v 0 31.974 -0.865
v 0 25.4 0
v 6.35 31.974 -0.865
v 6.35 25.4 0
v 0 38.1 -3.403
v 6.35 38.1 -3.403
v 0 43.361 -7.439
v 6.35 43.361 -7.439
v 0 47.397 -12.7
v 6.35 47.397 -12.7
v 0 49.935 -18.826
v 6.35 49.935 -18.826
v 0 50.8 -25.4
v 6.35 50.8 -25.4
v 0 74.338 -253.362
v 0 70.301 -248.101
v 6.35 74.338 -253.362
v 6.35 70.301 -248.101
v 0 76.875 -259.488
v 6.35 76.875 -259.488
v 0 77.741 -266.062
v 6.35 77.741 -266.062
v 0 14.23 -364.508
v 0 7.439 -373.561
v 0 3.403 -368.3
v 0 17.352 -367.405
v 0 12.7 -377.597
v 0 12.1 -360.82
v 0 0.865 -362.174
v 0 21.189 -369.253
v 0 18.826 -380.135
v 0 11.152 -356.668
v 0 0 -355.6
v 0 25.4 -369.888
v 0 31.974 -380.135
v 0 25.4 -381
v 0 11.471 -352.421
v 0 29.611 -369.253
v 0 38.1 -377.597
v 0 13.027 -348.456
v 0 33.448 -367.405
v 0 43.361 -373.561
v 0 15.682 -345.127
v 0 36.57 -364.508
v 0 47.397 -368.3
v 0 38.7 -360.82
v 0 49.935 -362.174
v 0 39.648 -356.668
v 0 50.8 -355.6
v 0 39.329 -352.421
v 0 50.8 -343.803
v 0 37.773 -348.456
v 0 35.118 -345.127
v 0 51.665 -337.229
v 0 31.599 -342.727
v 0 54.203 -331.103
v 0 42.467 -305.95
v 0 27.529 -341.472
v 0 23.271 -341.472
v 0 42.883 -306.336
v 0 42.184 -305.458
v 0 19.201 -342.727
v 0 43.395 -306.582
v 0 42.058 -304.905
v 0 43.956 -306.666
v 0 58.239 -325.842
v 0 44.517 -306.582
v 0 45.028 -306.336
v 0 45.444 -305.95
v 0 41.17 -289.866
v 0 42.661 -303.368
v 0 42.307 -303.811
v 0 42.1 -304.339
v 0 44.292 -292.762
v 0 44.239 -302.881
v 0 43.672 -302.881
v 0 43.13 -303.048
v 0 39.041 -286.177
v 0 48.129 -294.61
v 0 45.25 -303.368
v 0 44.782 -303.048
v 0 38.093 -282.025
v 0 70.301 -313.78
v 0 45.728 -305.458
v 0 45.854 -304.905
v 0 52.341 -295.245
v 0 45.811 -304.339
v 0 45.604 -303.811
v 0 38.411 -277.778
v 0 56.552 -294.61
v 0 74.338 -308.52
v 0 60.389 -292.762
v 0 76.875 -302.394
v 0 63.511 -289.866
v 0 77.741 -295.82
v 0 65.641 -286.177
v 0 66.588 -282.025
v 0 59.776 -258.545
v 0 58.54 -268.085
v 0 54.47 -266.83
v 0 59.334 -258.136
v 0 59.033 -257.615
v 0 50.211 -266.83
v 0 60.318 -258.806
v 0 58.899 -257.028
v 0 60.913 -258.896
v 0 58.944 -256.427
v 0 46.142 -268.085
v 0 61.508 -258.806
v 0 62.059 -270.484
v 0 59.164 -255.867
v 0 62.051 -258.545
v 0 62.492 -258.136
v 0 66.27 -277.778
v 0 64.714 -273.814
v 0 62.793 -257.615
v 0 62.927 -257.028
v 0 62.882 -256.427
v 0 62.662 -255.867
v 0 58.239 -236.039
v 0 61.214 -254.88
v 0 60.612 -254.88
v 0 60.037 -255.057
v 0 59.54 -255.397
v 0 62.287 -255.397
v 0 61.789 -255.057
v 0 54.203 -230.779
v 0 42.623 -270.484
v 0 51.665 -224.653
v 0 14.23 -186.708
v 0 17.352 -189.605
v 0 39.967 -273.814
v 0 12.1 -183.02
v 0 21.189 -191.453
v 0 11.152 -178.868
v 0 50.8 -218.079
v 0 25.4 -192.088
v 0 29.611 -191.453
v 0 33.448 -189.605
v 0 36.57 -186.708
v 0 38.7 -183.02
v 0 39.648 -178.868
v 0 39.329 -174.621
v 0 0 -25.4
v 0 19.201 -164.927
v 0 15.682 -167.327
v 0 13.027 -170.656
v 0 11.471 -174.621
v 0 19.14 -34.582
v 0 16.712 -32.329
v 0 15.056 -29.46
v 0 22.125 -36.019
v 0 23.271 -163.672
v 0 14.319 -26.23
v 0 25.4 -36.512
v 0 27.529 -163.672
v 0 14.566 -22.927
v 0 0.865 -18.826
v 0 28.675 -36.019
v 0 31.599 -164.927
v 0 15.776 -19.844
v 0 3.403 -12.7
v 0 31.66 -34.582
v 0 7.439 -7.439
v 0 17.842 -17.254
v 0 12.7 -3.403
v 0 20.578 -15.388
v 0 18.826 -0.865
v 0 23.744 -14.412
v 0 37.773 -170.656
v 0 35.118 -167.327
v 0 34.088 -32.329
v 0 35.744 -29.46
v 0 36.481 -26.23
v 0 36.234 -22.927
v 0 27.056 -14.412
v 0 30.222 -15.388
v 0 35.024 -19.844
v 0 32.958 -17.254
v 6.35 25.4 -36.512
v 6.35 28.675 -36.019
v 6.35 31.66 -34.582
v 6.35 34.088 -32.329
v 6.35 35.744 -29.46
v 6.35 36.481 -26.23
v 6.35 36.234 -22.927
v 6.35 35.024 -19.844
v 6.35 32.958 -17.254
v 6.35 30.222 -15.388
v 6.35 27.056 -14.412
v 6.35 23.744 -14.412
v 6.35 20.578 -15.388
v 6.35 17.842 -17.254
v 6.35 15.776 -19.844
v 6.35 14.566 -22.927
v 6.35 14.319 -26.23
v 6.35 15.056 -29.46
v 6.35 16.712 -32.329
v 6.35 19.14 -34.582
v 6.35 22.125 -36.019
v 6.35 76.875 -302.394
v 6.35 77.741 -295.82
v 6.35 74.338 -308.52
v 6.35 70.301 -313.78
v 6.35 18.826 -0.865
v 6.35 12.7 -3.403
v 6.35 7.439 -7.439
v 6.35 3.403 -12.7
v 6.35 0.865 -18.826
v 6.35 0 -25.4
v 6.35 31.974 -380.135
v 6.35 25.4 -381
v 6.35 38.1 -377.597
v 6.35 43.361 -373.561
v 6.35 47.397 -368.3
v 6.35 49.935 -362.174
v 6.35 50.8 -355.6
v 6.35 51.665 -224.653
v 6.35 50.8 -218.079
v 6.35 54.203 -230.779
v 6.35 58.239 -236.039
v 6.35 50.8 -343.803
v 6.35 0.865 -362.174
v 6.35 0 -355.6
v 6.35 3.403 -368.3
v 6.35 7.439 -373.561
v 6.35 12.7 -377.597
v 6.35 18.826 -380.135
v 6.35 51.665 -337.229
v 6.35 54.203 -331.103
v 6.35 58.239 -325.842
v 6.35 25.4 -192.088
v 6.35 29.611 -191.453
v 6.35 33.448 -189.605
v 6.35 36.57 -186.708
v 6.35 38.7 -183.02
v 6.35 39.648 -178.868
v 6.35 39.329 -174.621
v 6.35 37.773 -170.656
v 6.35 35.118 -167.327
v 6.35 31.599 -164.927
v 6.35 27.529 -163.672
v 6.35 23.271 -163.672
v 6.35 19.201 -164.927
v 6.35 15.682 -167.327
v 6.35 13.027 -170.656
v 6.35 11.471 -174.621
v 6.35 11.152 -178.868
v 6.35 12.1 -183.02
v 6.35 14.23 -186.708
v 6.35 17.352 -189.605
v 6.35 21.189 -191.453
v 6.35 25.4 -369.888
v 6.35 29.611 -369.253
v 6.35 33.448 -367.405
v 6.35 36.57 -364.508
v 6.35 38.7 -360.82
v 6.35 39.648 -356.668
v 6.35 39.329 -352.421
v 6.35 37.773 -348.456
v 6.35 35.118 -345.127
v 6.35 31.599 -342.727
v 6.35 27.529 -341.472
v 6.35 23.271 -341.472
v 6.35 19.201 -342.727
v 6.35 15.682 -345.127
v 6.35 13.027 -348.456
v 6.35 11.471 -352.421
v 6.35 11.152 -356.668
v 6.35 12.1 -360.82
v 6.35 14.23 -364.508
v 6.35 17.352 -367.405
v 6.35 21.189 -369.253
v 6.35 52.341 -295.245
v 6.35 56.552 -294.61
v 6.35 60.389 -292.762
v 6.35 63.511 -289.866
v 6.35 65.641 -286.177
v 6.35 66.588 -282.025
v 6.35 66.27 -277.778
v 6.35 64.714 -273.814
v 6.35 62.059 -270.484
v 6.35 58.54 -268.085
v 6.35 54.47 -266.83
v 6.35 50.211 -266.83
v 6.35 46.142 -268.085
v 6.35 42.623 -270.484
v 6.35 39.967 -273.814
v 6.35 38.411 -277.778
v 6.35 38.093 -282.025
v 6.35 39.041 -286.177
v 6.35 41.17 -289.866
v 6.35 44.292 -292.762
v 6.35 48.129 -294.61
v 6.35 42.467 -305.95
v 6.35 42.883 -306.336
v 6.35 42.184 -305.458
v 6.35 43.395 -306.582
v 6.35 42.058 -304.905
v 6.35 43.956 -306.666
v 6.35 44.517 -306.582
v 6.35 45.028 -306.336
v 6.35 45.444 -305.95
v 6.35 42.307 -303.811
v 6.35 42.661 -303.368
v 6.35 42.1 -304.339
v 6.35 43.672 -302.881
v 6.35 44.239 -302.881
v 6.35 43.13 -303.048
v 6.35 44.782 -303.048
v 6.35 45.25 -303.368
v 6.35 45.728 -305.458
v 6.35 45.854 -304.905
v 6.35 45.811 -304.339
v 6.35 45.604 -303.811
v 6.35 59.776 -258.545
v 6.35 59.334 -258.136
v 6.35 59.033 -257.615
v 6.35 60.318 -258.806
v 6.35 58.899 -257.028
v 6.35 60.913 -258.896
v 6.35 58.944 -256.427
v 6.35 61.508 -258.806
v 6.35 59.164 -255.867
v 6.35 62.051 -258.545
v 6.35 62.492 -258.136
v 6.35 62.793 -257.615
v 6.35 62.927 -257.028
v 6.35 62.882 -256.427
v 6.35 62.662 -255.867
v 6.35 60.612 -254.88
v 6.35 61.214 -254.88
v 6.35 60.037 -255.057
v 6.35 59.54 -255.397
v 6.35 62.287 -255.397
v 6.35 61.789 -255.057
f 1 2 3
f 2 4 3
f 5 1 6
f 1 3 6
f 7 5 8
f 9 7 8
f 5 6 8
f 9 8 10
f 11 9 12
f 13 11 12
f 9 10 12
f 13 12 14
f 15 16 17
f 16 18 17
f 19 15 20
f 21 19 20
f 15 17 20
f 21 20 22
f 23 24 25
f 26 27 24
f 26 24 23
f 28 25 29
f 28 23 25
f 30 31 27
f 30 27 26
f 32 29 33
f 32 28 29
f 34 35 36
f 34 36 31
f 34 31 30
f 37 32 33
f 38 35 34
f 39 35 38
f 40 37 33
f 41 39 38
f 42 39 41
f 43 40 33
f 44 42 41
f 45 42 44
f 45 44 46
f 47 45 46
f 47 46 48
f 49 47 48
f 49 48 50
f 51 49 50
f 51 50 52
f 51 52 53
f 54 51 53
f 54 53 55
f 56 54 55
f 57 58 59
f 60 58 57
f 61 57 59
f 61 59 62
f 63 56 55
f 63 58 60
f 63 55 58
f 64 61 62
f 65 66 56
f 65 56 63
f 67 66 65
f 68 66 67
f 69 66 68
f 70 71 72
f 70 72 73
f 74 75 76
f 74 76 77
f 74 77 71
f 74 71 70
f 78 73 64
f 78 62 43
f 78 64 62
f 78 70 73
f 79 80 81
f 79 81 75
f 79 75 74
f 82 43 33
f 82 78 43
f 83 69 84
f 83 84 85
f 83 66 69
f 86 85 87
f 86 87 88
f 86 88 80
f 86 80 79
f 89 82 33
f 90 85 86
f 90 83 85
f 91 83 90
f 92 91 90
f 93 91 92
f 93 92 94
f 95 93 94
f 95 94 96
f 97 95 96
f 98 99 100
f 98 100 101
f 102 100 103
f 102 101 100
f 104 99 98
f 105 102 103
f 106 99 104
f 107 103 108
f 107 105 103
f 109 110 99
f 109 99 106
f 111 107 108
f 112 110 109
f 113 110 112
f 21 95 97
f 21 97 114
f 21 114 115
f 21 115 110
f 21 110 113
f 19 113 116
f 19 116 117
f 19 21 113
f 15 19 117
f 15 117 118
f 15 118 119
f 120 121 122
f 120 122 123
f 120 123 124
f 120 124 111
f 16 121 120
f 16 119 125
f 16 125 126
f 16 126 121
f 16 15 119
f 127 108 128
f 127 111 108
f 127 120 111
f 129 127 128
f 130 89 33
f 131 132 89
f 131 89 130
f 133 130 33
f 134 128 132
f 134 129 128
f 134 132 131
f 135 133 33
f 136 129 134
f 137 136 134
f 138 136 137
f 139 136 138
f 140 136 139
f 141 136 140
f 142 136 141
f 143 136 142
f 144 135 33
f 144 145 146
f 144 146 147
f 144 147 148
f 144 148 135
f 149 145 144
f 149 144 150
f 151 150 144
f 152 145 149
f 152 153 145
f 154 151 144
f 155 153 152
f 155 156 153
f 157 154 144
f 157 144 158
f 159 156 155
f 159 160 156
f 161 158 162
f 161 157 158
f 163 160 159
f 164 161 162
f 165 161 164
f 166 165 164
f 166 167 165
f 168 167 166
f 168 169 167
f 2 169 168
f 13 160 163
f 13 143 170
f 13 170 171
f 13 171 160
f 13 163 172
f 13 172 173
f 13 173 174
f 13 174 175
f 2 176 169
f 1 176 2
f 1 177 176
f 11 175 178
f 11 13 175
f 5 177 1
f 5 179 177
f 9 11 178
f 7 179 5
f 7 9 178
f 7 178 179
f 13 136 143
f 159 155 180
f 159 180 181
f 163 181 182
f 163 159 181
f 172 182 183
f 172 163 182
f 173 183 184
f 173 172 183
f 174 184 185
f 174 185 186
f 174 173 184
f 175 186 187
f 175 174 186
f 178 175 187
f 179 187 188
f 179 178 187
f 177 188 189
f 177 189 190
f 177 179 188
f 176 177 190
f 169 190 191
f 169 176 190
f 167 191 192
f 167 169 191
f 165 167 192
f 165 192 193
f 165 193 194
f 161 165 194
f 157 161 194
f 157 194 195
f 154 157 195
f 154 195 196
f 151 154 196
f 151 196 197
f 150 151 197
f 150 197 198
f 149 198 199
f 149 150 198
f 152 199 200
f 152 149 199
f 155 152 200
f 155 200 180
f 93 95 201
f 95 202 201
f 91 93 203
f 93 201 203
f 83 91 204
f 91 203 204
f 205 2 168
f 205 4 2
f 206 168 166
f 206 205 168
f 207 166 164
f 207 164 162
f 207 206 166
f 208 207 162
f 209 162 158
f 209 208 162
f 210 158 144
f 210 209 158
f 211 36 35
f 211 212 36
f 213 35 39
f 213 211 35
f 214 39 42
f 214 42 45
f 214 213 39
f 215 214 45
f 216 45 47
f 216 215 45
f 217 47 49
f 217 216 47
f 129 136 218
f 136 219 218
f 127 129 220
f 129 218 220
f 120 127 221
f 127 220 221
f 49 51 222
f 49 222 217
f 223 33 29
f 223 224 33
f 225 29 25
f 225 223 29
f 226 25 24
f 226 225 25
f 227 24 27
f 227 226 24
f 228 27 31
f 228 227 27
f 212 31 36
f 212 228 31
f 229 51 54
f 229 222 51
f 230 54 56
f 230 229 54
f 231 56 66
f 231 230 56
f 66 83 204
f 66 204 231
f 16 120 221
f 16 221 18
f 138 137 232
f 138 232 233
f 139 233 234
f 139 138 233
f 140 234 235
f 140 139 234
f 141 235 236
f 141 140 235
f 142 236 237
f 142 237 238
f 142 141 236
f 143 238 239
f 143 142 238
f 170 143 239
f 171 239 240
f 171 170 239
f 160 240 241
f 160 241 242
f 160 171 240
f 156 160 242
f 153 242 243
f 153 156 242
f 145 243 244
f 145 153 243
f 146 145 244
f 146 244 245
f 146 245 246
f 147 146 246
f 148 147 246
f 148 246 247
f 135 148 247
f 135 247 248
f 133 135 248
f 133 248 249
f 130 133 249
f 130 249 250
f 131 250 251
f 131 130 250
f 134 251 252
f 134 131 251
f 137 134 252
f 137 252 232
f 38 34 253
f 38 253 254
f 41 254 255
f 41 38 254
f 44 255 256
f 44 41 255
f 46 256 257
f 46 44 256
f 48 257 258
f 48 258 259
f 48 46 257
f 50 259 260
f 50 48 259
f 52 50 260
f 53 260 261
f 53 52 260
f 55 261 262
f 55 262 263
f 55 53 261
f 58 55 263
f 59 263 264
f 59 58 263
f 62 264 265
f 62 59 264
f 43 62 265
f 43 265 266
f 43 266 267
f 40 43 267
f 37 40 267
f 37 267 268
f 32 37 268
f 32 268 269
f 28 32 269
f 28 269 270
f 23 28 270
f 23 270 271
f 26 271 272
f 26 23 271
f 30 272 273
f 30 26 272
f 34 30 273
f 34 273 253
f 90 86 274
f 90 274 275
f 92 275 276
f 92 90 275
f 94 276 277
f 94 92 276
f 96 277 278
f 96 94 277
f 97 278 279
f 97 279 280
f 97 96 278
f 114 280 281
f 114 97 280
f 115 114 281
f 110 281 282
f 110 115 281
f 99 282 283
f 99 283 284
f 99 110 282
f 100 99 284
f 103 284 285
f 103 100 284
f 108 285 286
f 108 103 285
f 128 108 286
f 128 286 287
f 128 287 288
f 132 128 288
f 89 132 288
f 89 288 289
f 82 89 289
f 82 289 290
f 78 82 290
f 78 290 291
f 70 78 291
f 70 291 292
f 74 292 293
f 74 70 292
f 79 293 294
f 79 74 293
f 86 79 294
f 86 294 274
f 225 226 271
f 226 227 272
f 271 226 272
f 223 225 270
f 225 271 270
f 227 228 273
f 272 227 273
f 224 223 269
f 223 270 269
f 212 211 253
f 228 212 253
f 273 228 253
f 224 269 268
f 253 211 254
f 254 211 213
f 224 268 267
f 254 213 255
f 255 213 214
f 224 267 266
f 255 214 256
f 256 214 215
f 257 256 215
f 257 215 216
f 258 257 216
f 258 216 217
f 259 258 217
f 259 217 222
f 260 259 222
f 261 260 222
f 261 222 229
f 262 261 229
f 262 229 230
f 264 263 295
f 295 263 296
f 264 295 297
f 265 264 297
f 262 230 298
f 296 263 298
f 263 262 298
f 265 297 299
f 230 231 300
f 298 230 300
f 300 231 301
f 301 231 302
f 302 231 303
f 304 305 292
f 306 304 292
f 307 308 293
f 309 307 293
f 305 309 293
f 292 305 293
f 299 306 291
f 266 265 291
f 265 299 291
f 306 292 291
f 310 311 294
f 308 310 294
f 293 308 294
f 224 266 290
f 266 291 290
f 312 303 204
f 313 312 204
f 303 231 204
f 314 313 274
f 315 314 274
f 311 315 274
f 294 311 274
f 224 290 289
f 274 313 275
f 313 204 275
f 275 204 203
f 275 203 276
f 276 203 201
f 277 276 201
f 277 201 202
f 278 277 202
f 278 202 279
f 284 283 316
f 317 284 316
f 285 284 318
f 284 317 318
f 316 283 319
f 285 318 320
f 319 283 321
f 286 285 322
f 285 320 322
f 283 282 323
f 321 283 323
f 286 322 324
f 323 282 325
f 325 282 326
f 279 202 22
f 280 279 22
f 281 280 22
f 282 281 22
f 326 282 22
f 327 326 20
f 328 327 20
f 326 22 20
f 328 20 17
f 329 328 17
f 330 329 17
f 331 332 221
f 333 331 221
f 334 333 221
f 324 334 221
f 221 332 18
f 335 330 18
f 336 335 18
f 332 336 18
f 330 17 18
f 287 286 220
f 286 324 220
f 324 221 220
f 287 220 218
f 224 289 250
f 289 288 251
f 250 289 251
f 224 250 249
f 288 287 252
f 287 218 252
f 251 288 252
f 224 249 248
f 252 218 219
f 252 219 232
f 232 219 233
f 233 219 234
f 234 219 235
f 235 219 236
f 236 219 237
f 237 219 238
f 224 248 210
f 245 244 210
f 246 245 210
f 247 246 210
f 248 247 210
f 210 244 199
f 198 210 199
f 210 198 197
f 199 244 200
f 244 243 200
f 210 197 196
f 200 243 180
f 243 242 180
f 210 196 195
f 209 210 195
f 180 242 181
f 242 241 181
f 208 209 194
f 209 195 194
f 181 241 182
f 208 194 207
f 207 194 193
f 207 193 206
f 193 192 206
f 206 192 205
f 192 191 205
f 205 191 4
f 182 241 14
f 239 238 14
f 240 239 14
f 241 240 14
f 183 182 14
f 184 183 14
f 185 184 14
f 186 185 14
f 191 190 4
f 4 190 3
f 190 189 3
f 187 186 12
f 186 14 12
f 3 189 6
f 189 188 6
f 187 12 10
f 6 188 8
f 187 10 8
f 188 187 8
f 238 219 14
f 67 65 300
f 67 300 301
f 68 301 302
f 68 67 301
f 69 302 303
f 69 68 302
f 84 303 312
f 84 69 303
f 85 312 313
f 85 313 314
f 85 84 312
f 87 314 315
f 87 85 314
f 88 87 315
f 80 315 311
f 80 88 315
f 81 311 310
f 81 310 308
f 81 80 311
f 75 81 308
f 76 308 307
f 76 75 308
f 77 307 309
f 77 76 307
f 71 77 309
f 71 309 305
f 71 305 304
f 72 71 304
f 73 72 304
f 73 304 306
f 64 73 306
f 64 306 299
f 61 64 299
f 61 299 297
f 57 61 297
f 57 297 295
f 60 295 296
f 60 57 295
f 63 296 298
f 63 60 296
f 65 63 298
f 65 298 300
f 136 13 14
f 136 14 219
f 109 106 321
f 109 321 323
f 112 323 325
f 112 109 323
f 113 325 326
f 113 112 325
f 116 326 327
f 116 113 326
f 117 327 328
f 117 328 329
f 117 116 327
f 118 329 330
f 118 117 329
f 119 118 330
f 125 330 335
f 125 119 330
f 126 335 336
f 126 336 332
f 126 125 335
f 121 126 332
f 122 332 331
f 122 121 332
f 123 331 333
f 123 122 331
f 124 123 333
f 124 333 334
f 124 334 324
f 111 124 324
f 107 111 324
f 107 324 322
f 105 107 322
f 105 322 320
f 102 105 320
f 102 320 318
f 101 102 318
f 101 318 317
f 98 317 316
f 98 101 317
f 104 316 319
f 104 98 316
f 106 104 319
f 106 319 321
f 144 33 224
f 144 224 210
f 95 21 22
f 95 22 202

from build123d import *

# Parameters (mm, degrees)
SKETCH1_R           = 11.1125
SKETCH1_R_2         = 14.2875
SKETCH1_R_3         = 1.903475963
SKETCH1_R_4         = 2.0193
BOSS_EXTRUDE1_DEPTH = 6.35
FILLET1_R           = 25.4


with BuildPart() as part:
    # Sketch1 → Boss-Extrude1 (new body)
    with BuildSketch(Plane(origin=(0, 0, 0), x_dir=(0, 0, -1), z_dir=(1, 0, 0))):
        Polygon((0, 0), (0, 50.8), (228.6, 50.8), (255.540768363, 77.740768363), (306.340768363, 77.740768363), (333.281536726, 50.8), (381, 50.8), (381, 0), align=None)
        with Locations((25.4, 25.4)):
            Circle(SKETCH1_R, mode=Mode.SUBTRACT)
        with Locations((280.957536726, 52.340768363)):
            Circle(SKETCH1_R_2, mode=Mode.SUBTRACT)
        with Locations((355.6, 25.4)):
            Circle(SKETCH1_R_2, mode=Mode.SUBTRACT)
        with Locations((177.8, 25.4)):
            Circle(SKETCH1_R_2, mode=Mode.SUBTRACT)
        with Locations((304.762985996, 43.955677033)):
            Circle(SKETCH1_R_3, mode=Mode.SUBTRACT)
        with Locations((256.876798248, 60.913065482)):
            Circle(SKETCH1_R_4, mode=Mode.SUBTRACT)
    extrude(amount=BOSS_EXTRUDE1_DEPTH)

    # Fillet1
    fillet1_edges = [part.edges().sort_by_distance(p)[0] for p in [
        (3.175, 50.8, -228.6),
        (3.175, 50.8, -333.281536726),
        (3.175, 77.740768363, -306.340768363),
        (3.175, 77.740768363, -255.540768363),
        (3.175, 0, -381),
        (3.175, 50.8, -381),
        (3.175, 0, 0),
        (3.175, 50.8, 0),
    ]]
    fillet(fillet1_edges, radius=FILLET1_R - 0.0001)  # a hair under: the kernel refuses the full size


solid = part.part
